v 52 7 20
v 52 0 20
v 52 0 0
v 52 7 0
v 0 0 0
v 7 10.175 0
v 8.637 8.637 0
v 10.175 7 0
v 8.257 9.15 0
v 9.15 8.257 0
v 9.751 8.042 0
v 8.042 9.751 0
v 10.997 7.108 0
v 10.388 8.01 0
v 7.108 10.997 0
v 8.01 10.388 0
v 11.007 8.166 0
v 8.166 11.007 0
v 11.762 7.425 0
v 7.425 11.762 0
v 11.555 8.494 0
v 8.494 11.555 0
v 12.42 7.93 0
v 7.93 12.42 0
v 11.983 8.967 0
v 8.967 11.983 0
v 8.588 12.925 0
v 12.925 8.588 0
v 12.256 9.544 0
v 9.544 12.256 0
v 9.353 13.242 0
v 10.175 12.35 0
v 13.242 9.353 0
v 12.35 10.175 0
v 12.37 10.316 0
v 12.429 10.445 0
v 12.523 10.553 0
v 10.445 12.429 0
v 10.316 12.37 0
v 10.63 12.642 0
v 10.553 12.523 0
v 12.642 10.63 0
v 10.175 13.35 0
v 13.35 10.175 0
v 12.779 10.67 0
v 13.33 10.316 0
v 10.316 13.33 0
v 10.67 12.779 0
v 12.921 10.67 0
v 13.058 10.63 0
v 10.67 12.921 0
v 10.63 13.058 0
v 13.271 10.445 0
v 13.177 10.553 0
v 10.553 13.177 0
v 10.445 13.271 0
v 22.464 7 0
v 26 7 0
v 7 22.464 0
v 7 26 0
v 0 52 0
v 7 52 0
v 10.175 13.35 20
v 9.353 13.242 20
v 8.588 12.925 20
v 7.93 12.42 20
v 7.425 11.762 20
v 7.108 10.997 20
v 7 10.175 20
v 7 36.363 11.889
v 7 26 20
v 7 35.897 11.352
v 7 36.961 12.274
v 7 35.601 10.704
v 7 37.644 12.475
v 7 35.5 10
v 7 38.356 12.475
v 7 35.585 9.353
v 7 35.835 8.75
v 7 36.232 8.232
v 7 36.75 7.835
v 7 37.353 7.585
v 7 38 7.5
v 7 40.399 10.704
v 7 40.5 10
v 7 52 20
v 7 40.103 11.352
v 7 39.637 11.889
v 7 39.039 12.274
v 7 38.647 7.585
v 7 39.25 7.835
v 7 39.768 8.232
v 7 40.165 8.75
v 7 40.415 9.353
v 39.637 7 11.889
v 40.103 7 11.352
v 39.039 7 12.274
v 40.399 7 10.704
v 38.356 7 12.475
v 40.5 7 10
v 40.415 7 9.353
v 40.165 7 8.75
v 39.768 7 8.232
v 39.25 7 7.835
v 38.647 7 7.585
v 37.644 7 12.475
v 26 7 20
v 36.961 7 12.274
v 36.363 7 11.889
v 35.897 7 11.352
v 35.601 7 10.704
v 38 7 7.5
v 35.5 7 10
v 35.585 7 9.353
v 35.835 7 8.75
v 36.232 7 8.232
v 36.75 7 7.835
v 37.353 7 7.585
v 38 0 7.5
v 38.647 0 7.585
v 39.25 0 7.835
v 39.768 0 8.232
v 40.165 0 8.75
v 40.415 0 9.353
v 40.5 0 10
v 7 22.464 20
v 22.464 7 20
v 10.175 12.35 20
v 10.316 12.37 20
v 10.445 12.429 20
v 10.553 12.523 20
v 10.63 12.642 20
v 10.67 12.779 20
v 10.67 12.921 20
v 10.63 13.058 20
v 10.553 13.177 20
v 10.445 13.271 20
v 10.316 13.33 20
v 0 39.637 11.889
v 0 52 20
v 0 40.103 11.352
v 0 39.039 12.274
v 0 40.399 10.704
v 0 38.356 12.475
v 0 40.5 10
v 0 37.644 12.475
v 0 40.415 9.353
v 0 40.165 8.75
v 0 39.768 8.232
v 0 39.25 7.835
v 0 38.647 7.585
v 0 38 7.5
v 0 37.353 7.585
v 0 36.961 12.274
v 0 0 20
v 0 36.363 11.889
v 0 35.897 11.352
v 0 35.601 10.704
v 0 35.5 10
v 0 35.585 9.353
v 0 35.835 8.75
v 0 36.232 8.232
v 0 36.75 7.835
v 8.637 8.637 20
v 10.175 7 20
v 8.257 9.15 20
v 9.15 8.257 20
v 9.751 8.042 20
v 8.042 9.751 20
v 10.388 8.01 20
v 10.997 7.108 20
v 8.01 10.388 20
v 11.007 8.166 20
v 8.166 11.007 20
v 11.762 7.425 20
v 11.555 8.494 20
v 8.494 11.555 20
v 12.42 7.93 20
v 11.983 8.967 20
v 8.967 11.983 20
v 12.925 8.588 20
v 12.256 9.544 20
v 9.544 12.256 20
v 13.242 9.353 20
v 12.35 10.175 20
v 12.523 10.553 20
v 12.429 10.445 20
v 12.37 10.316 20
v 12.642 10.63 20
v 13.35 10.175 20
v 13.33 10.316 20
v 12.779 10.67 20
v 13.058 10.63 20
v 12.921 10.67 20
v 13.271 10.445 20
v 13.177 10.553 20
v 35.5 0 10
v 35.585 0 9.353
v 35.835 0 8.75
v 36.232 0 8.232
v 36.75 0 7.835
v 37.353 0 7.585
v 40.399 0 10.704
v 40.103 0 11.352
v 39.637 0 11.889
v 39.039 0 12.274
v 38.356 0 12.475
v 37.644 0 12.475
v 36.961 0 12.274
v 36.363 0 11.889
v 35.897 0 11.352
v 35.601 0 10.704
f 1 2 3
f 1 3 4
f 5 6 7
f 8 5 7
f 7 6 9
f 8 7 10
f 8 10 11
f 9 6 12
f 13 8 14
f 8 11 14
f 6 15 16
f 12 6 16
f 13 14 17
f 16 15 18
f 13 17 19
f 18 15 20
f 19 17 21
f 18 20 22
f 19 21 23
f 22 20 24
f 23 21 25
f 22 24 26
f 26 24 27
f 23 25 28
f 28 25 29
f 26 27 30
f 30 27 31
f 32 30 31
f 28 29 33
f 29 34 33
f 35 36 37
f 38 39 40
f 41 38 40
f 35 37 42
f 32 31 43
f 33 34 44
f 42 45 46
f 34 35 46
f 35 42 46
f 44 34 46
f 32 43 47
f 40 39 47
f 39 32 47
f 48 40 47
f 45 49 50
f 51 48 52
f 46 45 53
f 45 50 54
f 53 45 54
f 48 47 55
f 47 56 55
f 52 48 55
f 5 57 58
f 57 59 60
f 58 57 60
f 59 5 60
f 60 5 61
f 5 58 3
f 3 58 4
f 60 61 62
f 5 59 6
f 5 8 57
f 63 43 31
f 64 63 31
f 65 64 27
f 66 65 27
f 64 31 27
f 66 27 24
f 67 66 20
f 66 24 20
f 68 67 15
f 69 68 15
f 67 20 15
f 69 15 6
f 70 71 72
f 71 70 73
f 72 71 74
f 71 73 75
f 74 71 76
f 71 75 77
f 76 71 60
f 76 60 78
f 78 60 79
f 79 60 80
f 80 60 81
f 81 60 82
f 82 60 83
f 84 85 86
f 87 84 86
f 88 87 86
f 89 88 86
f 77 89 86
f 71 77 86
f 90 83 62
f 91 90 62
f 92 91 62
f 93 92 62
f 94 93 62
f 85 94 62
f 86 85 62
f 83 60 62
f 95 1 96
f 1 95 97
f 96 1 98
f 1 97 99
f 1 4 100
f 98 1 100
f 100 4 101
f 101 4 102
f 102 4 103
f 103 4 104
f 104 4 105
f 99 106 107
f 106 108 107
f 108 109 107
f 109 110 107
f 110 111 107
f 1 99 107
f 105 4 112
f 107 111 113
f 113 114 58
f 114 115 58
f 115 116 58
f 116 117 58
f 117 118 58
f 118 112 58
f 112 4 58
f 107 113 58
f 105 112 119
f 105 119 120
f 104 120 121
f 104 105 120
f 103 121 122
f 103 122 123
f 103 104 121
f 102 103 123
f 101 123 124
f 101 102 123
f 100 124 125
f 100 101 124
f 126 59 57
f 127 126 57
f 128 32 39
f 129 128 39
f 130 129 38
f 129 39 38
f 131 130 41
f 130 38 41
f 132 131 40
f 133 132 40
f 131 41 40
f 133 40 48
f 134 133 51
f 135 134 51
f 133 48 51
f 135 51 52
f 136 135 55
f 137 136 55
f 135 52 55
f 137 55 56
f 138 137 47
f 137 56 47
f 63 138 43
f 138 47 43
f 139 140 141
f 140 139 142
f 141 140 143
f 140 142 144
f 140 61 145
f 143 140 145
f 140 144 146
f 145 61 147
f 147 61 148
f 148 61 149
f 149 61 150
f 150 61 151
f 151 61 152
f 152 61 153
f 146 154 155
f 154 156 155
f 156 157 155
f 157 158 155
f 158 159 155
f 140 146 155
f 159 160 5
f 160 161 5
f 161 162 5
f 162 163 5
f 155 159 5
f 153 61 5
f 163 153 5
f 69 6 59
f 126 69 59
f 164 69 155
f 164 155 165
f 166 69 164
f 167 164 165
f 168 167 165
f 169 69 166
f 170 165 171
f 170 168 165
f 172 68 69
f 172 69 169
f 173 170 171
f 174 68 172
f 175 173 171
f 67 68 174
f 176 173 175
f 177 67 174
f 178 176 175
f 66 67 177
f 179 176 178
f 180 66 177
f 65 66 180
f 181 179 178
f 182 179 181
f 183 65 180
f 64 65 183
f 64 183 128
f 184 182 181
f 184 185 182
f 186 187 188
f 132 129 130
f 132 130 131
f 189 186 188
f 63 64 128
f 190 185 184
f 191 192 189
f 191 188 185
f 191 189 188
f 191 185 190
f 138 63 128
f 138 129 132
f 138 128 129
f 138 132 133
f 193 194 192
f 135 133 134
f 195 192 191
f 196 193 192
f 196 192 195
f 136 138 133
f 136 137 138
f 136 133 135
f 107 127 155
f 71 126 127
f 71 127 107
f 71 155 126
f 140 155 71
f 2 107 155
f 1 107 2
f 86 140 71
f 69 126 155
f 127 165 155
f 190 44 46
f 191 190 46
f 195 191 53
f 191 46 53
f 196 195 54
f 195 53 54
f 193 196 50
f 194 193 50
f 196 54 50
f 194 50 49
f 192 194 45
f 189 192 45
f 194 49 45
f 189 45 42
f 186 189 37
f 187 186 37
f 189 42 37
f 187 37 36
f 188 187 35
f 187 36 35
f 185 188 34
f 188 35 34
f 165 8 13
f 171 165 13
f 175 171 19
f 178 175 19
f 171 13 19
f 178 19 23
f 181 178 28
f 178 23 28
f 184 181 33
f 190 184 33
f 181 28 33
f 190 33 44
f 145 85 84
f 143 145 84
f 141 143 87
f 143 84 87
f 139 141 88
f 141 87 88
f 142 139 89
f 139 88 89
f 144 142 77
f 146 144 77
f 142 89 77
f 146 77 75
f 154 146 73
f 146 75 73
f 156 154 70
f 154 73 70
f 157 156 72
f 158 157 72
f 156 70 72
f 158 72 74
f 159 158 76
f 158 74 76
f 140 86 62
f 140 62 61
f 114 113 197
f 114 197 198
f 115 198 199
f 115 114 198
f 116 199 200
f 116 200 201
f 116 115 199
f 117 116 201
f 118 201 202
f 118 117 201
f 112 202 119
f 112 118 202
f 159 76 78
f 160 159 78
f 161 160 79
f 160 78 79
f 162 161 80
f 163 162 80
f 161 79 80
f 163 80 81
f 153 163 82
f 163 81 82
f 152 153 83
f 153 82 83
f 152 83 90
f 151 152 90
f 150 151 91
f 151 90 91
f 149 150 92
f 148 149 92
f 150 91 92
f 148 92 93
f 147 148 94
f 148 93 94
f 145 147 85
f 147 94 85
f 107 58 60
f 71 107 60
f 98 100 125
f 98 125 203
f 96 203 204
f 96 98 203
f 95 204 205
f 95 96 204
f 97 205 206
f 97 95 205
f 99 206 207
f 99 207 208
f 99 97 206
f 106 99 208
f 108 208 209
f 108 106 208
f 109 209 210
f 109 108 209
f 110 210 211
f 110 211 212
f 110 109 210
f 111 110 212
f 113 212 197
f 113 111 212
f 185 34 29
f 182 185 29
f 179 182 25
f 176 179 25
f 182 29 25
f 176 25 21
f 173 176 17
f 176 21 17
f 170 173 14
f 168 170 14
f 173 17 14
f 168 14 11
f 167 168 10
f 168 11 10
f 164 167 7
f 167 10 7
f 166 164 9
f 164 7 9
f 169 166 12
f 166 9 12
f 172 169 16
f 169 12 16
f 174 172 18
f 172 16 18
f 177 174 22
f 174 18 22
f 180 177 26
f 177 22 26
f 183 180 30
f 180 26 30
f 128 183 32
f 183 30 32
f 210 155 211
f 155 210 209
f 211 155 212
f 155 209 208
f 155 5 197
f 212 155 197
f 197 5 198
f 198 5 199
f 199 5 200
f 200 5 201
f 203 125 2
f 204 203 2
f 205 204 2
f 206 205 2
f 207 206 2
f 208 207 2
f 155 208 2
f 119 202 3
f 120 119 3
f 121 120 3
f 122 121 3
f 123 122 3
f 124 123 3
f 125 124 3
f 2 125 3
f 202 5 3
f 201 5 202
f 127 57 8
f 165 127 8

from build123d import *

# Parameters (mm, degrees)
BOSS_EXTRUDE1_DEPTH = 20
CUT_EXTRUDE1_DEPTH  = 7


with BuildPart() as part:
    # Sketch1 → Boss-Extrude1 (new body)
    with BuildSketch(Plane.XY):
        Polygon((0, 52), (0, 0), (52, 0), (52, 7), (26, 7), (7, 26), (7, 52), align=None)
        with BuildLine():
            Line((7, 10.175), (7, 22.464466094))
            Line((7, 22.464466094), (22.464466094, 7))
            Line((22.464466094, 7), (10.175, 7))
            ThreePointArc((10.175, 7), (12.42006403, 7.92993597), (13.35, 10.175))
            ThreePointArc((13.35, 10.175), (12.85, 10.675), (12.35, 10.175))
            ThreePointArc((12.35, 10.175), (8.637042751, 8.637042751), (10.175, 12.35))
            ThreePointArc((10.175, 12.35), (10.675, 12.85), (10.175, 13.35))
            ThreePointArc((10.175, 13.35), (7.92993597, 12.42006403), (7, 10.175))
        make_face(mode=Mode.SUBTRACT)
    extrude(amount=BOSS_EXTRUDE1_DEPTH)

    # Sketch2 → Cut-Extrude1 (cut)
    with BuildSketch(Plane(origin=(7, 0, 0), x_dir=(0, 0, -1), z_dir=(1, 0, 0))):
        with BuildLine():
            ThreePointArc((-7.5, 38), (-8.232233047, 39.767766953), (-10, 40.5))
            Line((-10, 40.5), (-10, 35.5))
            ThreePointArc((-10, 35.5), (-8.232233047, 36.232233047), (-7.5, 38))
        make_face()
        with BuildLine():
            Line((-10, 35.5), (-10, 40.5))
            ThreePointArc((-10, 40.5), (-12.5, 38), (-10, 35.5))
        make_face()
    cut_extrude1 = extrude(amount=-CUT_EXTRUDE1_DEPTH, mode=Mode.SUBTRACT)

    # Mirror4: Cut-Extrude1 across plane
    add(cut_extrude1.mirror(Plane(origin=(0, 0, 0), x_dir=(0, 0, 1), z_dir=(0.7071067811865438, -0.7071067811865512, 0))), mode=Mode.SUBTRACT)


solid = part.part
